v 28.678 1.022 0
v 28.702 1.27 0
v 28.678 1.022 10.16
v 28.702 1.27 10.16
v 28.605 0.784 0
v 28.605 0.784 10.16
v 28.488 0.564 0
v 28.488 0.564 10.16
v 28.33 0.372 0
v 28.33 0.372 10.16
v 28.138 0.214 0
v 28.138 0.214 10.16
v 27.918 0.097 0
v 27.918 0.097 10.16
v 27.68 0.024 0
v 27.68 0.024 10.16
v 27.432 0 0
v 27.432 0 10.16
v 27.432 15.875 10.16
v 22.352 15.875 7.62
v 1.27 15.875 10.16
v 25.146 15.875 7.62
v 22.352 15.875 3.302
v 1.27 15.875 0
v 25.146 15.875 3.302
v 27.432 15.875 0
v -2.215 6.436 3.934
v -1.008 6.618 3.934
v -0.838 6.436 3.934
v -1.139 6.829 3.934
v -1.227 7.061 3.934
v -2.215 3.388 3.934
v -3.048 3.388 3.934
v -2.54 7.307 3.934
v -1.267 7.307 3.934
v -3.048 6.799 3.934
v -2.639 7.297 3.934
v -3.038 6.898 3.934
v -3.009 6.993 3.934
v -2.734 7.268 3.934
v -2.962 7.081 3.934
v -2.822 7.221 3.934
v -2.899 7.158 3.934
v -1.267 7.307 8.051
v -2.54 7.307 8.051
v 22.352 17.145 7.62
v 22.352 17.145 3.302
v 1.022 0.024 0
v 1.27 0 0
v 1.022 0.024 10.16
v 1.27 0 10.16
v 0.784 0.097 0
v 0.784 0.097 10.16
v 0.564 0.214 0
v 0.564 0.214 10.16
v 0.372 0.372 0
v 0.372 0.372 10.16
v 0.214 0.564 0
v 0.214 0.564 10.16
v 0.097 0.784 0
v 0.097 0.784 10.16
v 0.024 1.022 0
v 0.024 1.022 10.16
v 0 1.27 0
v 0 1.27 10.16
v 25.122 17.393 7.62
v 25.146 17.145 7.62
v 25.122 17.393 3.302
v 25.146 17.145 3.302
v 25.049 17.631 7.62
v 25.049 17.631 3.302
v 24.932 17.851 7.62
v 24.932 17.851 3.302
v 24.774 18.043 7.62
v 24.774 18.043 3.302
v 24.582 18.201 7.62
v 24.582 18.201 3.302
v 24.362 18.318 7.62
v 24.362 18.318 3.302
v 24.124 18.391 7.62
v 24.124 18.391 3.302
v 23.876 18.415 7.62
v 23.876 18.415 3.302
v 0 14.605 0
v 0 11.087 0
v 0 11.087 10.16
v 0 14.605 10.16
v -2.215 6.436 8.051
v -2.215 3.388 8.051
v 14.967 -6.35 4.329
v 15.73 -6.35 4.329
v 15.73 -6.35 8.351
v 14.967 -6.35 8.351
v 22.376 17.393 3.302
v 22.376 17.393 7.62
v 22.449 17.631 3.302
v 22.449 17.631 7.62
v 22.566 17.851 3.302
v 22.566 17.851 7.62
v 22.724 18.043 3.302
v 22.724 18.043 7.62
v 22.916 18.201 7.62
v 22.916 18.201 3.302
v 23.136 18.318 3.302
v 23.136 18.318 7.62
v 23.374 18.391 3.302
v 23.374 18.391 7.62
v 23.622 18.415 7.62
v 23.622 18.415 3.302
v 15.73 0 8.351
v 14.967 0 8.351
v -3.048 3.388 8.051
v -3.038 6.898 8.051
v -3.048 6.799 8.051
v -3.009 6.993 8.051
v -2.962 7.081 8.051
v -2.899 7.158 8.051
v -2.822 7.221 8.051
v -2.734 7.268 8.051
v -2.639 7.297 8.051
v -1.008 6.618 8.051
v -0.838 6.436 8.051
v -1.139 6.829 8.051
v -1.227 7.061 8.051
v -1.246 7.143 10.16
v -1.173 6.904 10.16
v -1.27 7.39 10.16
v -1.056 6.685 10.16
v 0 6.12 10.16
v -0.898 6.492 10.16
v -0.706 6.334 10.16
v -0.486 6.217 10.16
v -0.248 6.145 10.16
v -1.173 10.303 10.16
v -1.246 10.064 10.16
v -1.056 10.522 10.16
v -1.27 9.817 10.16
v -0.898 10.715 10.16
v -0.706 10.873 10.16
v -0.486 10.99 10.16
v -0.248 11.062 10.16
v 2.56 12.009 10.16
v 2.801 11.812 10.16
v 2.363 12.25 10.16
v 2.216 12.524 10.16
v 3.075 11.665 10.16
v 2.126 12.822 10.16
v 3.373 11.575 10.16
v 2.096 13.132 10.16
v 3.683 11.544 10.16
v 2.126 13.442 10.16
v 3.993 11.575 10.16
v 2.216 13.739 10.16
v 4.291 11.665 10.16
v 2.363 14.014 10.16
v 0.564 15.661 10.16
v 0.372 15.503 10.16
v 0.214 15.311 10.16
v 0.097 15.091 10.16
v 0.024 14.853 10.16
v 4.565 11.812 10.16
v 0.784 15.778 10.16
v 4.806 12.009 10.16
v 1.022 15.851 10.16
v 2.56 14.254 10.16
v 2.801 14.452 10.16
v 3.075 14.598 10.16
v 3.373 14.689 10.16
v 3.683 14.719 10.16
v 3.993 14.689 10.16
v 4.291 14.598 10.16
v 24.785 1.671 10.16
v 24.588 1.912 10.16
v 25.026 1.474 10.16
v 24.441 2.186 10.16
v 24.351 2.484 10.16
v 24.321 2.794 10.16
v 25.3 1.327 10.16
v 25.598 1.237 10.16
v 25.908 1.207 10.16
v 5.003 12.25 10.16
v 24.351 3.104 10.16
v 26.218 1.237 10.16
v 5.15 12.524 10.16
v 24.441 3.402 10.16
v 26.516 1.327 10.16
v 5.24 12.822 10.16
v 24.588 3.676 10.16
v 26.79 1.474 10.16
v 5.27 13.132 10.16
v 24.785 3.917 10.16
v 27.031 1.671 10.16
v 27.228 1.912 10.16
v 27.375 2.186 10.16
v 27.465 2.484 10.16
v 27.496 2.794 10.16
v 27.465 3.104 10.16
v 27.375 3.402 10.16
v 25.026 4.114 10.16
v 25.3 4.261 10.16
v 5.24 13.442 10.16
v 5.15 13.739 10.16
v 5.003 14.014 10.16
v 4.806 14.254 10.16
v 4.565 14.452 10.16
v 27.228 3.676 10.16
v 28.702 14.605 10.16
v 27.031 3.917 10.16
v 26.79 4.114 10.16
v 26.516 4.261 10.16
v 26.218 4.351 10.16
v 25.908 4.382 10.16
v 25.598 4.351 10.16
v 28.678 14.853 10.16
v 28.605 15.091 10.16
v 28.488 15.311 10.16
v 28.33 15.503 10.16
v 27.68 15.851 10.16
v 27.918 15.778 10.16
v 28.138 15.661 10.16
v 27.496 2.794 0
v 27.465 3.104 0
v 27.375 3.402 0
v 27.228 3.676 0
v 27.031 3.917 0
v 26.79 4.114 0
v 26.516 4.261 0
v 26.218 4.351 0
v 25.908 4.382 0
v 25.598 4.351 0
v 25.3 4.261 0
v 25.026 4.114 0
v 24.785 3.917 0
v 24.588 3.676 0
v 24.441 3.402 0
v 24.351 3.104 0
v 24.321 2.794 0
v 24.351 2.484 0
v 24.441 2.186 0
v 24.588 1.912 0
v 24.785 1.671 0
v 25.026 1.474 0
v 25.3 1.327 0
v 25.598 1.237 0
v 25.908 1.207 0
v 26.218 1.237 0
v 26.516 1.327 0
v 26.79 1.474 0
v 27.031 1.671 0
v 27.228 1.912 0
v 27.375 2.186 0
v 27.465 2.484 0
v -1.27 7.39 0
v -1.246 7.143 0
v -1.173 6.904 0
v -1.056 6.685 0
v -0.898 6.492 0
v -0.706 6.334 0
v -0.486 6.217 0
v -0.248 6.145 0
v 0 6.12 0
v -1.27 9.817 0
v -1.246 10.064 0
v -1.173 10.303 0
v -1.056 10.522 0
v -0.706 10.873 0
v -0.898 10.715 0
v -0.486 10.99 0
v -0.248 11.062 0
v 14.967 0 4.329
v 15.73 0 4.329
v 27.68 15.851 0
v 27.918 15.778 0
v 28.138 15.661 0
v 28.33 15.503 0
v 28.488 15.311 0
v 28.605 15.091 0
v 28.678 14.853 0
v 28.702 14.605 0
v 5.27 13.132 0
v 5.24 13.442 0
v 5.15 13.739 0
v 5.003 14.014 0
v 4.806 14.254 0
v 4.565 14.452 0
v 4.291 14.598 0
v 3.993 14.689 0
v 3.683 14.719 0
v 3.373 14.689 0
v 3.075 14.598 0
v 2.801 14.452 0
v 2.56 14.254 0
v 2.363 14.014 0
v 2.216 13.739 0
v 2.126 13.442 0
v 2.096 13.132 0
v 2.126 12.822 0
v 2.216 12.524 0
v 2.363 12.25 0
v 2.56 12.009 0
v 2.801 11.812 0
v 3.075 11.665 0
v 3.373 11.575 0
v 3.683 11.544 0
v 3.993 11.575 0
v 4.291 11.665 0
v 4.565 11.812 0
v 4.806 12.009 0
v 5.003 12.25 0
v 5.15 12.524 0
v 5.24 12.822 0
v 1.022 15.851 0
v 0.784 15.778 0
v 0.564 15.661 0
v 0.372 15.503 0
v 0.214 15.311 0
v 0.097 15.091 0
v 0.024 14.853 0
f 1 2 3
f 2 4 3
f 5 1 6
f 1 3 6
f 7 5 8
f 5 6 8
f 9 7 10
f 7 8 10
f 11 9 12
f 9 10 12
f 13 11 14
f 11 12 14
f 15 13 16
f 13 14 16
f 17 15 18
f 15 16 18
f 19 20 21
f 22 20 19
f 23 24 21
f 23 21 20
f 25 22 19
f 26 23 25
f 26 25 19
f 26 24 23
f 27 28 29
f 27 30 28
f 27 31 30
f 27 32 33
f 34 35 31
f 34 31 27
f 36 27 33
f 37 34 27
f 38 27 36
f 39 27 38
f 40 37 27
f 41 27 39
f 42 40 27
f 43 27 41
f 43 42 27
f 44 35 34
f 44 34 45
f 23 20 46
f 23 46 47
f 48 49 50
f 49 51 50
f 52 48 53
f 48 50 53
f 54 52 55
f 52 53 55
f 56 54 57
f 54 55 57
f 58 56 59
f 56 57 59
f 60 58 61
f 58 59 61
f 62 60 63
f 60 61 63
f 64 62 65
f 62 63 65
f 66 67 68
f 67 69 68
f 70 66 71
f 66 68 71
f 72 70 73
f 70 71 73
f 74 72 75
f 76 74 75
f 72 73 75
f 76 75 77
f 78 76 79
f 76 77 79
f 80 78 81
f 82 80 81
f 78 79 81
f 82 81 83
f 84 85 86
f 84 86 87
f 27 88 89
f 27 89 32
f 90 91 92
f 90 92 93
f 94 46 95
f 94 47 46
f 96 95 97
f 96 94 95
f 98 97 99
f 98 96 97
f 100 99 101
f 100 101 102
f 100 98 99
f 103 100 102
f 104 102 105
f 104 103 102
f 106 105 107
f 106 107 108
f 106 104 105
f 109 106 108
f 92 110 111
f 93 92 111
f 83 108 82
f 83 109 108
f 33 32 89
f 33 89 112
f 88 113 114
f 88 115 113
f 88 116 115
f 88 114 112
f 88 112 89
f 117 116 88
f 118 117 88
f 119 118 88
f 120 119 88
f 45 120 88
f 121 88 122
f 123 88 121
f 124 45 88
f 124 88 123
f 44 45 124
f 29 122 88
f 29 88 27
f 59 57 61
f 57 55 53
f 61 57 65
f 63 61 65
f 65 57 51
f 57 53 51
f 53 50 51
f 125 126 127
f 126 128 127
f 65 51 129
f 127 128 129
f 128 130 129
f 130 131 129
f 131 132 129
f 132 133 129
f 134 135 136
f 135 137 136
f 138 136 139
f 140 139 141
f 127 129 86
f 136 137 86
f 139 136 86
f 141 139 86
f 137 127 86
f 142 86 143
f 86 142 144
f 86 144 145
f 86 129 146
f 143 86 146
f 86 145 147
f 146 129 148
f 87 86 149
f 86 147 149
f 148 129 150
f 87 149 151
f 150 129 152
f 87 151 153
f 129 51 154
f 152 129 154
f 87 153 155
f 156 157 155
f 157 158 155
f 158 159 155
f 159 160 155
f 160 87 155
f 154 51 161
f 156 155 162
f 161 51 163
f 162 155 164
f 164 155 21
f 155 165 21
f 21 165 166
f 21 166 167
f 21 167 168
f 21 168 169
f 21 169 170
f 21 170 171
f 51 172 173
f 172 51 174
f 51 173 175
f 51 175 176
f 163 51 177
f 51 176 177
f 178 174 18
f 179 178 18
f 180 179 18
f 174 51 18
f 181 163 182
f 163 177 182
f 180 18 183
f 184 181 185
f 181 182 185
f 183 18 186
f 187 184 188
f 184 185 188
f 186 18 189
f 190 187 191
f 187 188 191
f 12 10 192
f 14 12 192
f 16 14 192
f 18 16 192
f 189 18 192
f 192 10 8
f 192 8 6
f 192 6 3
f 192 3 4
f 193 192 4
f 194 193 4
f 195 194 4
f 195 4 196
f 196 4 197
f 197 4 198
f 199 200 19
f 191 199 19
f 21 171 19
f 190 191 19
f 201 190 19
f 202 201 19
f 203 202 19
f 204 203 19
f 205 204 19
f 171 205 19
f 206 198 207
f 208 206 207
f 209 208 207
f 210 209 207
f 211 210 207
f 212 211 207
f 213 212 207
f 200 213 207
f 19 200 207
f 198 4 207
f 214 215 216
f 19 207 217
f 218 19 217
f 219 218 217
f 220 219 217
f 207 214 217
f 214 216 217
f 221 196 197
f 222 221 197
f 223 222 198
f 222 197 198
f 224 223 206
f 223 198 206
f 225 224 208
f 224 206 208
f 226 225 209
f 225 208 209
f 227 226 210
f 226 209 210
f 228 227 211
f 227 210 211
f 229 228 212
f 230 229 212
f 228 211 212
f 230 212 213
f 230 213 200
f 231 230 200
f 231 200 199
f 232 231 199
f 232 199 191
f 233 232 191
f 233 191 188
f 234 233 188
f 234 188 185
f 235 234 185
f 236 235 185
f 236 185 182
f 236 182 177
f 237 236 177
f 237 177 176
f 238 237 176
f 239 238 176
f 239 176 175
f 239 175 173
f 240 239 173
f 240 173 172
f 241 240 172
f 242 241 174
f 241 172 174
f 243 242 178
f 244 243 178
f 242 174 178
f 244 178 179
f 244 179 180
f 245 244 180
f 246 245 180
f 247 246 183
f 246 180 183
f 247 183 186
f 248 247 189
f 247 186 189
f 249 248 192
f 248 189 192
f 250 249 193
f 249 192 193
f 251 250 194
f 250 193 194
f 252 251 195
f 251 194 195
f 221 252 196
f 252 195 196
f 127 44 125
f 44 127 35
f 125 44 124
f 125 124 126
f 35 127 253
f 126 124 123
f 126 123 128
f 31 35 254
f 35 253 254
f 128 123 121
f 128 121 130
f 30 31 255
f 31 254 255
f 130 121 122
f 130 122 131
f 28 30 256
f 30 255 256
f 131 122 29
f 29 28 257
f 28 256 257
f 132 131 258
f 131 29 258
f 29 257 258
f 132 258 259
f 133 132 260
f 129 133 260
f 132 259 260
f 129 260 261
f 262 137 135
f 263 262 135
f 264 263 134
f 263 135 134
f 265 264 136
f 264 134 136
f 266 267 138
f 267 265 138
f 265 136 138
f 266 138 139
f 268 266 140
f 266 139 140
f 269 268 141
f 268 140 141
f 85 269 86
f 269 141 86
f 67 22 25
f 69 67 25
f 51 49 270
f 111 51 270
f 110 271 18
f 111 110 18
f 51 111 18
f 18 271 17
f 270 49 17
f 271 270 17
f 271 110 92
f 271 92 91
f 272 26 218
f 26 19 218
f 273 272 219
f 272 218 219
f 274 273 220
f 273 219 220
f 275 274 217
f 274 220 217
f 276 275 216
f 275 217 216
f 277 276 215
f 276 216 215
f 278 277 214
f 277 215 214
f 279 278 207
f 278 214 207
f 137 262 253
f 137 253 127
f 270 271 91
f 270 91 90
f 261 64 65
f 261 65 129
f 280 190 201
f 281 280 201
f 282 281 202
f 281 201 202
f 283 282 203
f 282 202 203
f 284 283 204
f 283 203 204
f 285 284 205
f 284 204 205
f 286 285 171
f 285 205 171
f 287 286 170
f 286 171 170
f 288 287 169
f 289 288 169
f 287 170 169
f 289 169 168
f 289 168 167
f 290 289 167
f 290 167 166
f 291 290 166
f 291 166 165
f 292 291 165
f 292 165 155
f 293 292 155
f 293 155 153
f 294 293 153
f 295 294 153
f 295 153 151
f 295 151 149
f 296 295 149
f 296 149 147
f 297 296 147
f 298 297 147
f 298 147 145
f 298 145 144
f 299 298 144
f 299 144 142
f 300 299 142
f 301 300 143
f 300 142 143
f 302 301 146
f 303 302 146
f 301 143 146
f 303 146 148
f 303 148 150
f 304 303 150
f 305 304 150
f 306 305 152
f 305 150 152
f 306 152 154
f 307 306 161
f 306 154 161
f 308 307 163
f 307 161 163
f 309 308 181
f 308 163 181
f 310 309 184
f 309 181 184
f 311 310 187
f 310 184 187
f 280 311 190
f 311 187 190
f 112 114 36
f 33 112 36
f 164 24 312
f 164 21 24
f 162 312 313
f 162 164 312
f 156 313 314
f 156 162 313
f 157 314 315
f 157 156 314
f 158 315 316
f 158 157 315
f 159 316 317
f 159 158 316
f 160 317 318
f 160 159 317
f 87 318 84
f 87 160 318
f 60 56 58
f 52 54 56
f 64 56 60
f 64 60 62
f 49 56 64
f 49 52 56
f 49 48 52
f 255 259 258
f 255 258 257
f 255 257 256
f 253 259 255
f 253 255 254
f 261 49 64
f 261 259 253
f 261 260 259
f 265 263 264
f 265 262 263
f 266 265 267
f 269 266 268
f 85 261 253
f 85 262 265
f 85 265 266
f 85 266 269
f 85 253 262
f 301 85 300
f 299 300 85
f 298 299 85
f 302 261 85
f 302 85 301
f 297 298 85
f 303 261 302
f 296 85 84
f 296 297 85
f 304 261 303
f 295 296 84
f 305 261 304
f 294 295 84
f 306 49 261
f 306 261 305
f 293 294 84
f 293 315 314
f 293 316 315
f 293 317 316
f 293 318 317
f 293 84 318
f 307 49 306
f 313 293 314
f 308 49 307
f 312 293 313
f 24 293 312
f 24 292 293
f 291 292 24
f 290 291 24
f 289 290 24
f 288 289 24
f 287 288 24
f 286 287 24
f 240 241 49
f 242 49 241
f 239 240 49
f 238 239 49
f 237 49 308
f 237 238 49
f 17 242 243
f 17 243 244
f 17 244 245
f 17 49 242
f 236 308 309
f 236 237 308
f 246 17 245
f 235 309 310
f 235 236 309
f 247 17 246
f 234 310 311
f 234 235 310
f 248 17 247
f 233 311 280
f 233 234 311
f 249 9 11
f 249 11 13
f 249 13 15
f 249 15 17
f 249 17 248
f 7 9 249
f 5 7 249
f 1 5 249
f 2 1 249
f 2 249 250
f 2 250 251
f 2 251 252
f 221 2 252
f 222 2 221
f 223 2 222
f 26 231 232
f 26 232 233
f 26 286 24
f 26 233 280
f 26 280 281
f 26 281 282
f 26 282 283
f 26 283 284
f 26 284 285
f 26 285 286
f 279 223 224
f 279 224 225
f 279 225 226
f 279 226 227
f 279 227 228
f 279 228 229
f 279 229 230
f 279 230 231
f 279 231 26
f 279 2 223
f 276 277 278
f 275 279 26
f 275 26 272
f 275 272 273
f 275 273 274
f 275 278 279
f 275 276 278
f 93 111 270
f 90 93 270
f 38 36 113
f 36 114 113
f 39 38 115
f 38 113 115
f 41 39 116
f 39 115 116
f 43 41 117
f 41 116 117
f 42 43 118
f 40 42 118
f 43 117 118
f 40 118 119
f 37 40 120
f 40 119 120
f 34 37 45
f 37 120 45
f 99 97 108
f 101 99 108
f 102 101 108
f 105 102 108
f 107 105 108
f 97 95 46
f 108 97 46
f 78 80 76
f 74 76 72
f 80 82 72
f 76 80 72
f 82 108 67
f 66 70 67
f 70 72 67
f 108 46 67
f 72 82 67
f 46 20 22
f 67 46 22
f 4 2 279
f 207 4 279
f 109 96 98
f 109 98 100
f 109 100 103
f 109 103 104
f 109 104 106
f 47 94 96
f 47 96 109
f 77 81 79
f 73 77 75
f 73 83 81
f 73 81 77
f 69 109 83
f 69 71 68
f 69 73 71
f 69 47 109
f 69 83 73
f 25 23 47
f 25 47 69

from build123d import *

# Parameters (mm, degrees)
SKETCH1_W           = 28.702
SKETCH1_H           = 15.875
BOSS_EXTRUDE1_DEPTH = 10.16
SKETCH2_R           = 1.5875
CUT_EXTRUDE1_DEPTH  = 12.4206
SKETCH4_W           = 0.763653933
SKETCH4_H           = 4.021910712
BOSS_EXTRUDE2_DEPTH = 6.35
SKETCH5_W           = 4.11779101
SKETCH5_H           = 0.870547728
BOSS_EXTRUDE3_DEPTH = 3.048
SKETCH6_W           = 0.83333033
SKETCH6_H           = 4.11779101
BOSS_EXTRUDE4_DEPTH = 3.048
FILLET1_R           = 0.508
SKETCH7_W           = 10.16
SKETCH7_H           = 4.966371196
BOSS_EXTRUDE5_DEPTH = 1.27
SKETCH8_W           = 2.794
SKETCH8_H           = 4.318
BOSS_EXTRUDE6_DEPTH = 2.54
FILLET3_R           = 1.27
FILLET5_R           = 1.27
FILLET6_R           = 1.27


with BuildPart() as part:
    # Sketch1 → Boss-Extrude1 (new body)
    with BuildSketch(Plane.XY):
        with Locations((14.351, 7.9375)):
            Rectangle(SKETCH1_W, SKETCH1_H)
    extrude(amount=BOSS_EXTRUDE1_DEPTH)

    # Sketch2 → Cut-Extrude1 (cut)
    with BuildSketch(Plane.XY.offset(10.16)):
        with Locations((3.683, 13.1318)):
            Circle(SKETCH2_R)
        with Locations((25.908, 2.794)):
            Circle(SKETCH2_R)
    extrude(amount=-CUT_EXTRUDE1_DEPTH, mode=Mode.SUBTRACT)

    # Sketch4 → Boss-Extrude2 (add)
    with BuildSketch(Plane(origin=(0, 0, 0), x_dir=(-1, 0, 0), z_dir=(0, -1, 0))):
        with Locations((-15.348638273, -6.340278275)):
            Rectangle(SKETCH4_W, SKETCH4_H)
    extrude(amount=BOSS_EXTRUDE2_DEPTH)

    # Sketch5 → Boss-Extrude3 (add)
    with BuildSketch(Plane.ZY):
        with Locations((5.992449892, 6.871421324)):
            Rectangle(SKETCH5_W, SKETCH5_H)
    extrude(amount=BOSS_EXTRUDE3_DEPTH)

    # Sketch6 → Boss-Extrude4 (add)
    with BuildSketch(Plane(origin=(0, 6.43614746, 0), x_dir=(-1, 0, 0), z_dir=(0, -1, 0))):
        with Locations((2.631334835, -5.992449892)):
            Rectangle(SKETCH6_W, SKETCH6_H)
    extrude(amount=BOSS_EXTRUDE4_DEPTH)

    # Fillet1
    fillet1_edges = [part.edges().sort_by_distance(p)[0] for p in [
        (-3.048, 7.306695188, 5.992449892),
    ]]
    fillet(fillet1_edges, radius=FILLET1_R)

    # Sketch7 → Boss-Extrude5 (add)
    with BuildSketch(Plane.ZY):
        with Locations((5.08, 8.603517934)):
            Rectangle(SKETCH7_W, SKETCH7_H)
    extrude(amount=BOSS_EXTRUDE5_DEPTH)

    # Sketch8 → Boss-Extrude6 (add)
    with BuildSketch(Plane(origin=(0, 15.875, 0), x_dir=(1, 0, 0), z_dir=(0, 1, 0))):
        with Locations((23.749, -5.461)):
            Rectangle(SKETCH8_W, SKETCH8_H)
    extrude(amount=BOSS_EXTRUDE6_DEPTH)

    # Fillet3
    fillet3_edges = [part.edges().sort_by_distance(p)[0] for p in [
        (22.352, 18.415, 5.461),
        (25.146, 18.415, 5.461),
    ]]
    fillet(fillet3_edges, radius=FILLET3_R)

    # Fillet5
    fillet5_edges = [part.edges().sort_by_distance(p)[0] for p in [
        (0, 15.875, 5.08),
        (28.702, 15.875, 5.08),
        (28.702, 0, 5.08),
        (0, 0, 5.08),
    ]]
    fillet(fillet5_edges, radius=FILLET5_R)

    # Fillet6
    # the kernel refuses this fillet: 1.27 mm, written as the material it takes off along each edge
    with BuildSketch(Plane(origin=(-1.27, 6.120332336, -3.175), x_dir=(1, 0, 0), z_dir=(0, 0, 1))) as fillet6_piece_1_section:
        with BuildLine():
            CenterArc((FILLET6_R, FILLET6_R), FILLET6_R, 180, 90)
            Line((0, FILLET6_R), (0, 0))
            Line((0, 0), (FILLET6_R, 0))
        make_face()
    fillet6_piece_1 = extrude(amount=16.51, mode=Mode.PRIVATE)
    fillet6_piece_1 = split(fillet6_piece_1, bisect_by=Plane(origin=(-0.894827344, 6.253367253, 3.933554387), z_dir=(0, 0, -1)), keep=Keep.TOP, mode=Mode.PRIVATE)
    add(fillet6_piece_1, mode=Mode.SUBTRACT)
    with BuildSketch(Plane(origin=(-1.27, 6.120332336, -3.175), x_dir=(1, 0, 0), z_dir=(0, 0, 1))) as fillet6_piece_2_section:
        with BuildLine():
            CenterArc((FILLET6_R, FILLET6_R), FILLET6_R, 180, 90)
            Line((0, FILLET6_R), (0, 0))
            Line((0, 0), (FILLET6_R, 0))
        make_face()
    fillet6_piece_2 = extrude(amount=16.51, mode=Mode.PRIVATE)
    fillet6_piece_2 = split(fillet6_piece_2, bisect_by=Plane(origin=(-0.894827344, 6.43614746, 5.992449892), z_dir=(0, -1, 0)), keep=Keep.TOP, mode=Mode.PRIVATE)
    add(fillet6_piece_2, mode=Mode.SUBTRACT)
    with BuildSketch(Plane(origin=(-1.27, 6.120332336, -3.175), x_dir=(1, 0, 0), z_dir=(0, 0, 1))) as fillet6_piece_3_section:
        with BuildLine():
            CenterArc((FILLET6_R, FILLET6_R), FILLET6_R, 180, 90)
            Line((0, FILLET6_R), (0, 0))
            Line((0, 0), (FILLET6_R, 0))
        make_face()
    fillet6_piece_3 = extrude(amount=16.51, mode=Mode.PRIVATE)
    fillet6_piece_3 = split(fillet6_piece_3, bisect_by=Plane(origin=(-1.269173055, 7.306695188, 5.992449892), z_dir=(0, 1, 0)), keep=Keep.TOP, mode=Mode.PRIVATE)
    add(fillet6_piece_3, mode=Mode.SUBTRACT)
    with BuildSketch(Plane(origin=(-1.27, 6.120332336, -3.175), x_dir=(1, 0, 0), z_dir=(0, 0, 1))) as fillet6_piece_4_section:
        with BuildLine():
            CenterArc((FILLET6_R, FILLET6_R), FILLET6_R, 180, 90)
            Line((0, FILLET6_R), (0, 0))
            Line((0, 0), (FILLET6_R, 0))
        make_face()
    fillet6_piece_4 = extrude(amount=16.51, mode=Mode.PRIVATE)
    fillet6_piece_4 = split(fillet6_piece_4, bisect_by=Plane(origin=(-1.145263538, 6.665418953, 8.051345397), z_dir=(0, 0, 1)), keep=Keep.TOP, mode=Mode.PRIVATE)
    add(fillet6_piece_4, mode=Mode.SUBTRACT)
    with BuildSketch(Plane(origin=(-1.27, 11.086703532, 13.335), x_dir=(0, -1, 0), z_dir=(0, 0, -1))) as fillet6_piece_5:
        with BuildLine():
            CenterArc((FILLET6_R, -FILLET6_R), FILLET6_R, 90, 90)
            Line((0, -FILLET6_R), (0, 0))
            Line((0, 0), (FILLET6_R, 0))
        make_face()
    extrude(amount=16.51, mode=Mode.SUBTRACT)


solid = part.part
